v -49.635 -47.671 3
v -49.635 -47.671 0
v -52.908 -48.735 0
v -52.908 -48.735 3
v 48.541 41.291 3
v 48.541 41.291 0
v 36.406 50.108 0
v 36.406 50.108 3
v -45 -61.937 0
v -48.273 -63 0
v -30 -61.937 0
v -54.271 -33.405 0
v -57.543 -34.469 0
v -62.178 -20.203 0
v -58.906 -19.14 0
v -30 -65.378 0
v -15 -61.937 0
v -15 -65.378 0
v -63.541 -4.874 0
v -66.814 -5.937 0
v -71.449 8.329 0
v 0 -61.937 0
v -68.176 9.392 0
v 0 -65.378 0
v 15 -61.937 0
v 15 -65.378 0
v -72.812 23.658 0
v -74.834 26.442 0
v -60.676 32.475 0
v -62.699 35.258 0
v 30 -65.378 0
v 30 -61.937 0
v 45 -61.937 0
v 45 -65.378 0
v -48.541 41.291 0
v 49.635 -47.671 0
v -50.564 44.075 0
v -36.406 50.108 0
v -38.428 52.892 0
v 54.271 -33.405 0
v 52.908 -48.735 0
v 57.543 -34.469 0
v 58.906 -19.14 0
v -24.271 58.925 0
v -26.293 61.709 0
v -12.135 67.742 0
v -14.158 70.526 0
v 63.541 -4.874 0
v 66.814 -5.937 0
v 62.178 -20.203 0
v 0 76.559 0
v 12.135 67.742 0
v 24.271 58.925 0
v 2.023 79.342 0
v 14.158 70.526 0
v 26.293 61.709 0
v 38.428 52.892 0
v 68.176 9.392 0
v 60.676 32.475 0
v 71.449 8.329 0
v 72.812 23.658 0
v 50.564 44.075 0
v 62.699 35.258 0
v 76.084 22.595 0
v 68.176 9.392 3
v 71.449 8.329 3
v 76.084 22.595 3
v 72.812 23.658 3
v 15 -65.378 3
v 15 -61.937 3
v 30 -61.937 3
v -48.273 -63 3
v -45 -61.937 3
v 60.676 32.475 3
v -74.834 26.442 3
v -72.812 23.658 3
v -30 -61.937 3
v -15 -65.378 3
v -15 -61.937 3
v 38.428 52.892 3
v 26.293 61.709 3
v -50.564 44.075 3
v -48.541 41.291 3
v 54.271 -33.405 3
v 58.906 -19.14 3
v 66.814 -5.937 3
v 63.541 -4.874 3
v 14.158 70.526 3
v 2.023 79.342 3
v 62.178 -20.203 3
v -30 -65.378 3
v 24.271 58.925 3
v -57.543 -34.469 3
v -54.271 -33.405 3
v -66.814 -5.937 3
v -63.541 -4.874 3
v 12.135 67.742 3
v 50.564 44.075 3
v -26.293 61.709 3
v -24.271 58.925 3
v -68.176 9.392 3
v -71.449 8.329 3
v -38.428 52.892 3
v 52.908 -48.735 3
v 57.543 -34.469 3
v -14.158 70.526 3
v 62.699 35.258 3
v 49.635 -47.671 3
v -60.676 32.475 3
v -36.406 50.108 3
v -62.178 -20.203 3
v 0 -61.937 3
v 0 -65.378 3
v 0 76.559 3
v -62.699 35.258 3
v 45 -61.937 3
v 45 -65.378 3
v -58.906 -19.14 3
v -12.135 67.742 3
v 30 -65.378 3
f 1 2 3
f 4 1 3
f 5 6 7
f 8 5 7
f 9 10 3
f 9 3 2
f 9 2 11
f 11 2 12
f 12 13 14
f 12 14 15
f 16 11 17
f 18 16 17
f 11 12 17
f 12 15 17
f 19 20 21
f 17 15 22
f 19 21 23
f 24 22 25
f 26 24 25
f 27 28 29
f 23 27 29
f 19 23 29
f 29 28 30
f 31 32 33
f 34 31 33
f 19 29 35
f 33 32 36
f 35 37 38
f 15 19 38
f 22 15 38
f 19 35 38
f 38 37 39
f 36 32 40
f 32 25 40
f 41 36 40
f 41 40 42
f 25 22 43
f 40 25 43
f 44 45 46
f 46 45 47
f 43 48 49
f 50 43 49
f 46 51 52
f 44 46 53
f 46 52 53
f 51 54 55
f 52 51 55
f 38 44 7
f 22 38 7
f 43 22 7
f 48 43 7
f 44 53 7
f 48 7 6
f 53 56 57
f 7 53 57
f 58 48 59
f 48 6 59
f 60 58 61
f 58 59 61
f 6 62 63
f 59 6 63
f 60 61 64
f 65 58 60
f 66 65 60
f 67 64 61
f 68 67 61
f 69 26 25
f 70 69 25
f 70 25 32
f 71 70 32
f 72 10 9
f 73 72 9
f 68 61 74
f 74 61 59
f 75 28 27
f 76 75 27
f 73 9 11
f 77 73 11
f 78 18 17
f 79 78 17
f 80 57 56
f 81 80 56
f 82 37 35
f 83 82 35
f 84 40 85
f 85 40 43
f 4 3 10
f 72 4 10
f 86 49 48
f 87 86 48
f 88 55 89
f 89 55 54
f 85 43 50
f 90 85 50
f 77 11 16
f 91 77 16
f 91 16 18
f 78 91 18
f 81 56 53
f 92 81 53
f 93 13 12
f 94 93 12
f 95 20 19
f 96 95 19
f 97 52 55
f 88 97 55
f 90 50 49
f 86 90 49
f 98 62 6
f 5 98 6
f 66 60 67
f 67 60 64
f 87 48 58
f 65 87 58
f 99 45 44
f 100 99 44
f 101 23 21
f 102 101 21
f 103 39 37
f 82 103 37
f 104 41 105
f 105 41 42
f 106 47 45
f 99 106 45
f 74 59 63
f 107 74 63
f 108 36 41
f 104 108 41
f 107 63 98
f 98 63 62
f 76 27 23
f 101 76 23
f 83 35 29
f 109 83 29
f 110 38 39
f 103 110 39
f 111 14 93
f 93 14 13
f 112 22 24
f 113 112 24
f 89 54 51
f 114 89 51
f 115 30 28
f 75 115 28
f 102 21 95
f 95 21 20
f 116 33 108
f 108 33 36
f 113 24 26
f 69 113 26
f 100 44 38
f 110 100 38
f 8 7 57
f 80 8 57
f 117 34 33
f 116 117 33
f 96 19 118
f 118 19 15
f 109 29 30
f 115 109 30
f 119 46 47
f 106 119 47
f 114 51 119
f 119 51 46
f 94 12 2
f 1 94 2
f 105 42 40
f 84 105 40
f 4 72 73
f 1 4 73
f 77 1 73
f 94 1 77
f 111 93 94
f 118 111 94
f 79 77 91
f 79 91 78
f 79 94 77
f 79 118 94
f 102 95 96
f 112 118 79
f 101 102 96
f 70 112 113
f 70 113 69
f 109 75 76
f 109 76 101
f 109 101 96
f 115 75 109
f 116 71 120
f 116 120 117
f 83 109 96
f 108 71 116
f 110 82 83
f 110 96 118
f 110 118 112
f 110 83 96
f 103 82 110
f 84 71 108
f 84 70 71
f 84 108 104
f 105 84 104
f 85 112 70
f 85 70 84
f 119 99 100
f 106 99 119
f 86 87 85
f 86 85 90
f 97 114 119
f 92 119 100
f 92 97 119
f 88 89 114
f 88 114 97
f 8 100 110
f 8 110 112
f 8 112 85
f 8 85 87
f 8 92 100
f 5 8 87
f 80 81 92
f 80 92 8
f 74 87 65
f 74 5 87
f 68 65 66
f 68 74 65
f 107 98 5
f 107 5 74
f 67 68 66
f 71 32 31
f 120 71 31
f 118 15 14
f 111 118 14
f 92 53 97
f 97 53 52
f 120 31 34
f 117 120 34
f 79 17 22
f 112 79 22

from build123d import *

# Parameters (mm, degrees)
F1_DEPTH = 3


with BuildPart() as f1:
    # F0 (on Top) → F1 (new body)
    with BuildSketch(Plane.XY):
        Polygon((63.54102, -4.873795), (68.176275, 9.392052), (71.448817, 8.328739), (76.084072, 22.594587), (72.811529, 23.6579), (60.676275, 32.474679), (62.698817, 35.25847), (50.563562, 44.075249), (48.54102, 41.291458), (36.405765, 50.108236), (38.428307, 52.892027), (26.293052, 61.708806), (24.27051, 58.925015), (12.135255, 67.741794), (14.157797, 70.525585), (2.022542, 79.342364), (0, 76.558573), (-12.135255, 67.741794), (-14.157797, 70.525585), (-26.293052, 61.708806), (-24.27051, 58.925015), (-36.405765, 50.108236), (-38.428307, 52.892027), (-50.563562, 44.075249), (-48.54102, 41.291458), (-60.676275, 32.474679), (-62.698817, 35.25847), (-74.834072, 26.441691), (-72.811529, 23.6579), (-68.176275, 9.392052), (-71.448817, 8.328739), (-66.813562, -5.937109), (-63.54102, -4.873795), (-58.905765, -19.139643), (-62.178307, -20.202957), (-57.543052, -34.468804), (-54.27051, -33.405491), (-49.635255, -47.671339), (-52.907797, -48.734652), (-48.272542, -63.0005), (-45, -61.937186), (-30, -61.937186), (-30, -65.378141), (-15, -65.378141), (-15, -61.937186), (0, -61.937186), (0, -65.378141), (15, -65.378141), (15, -61.937186), (30, -61.937186), (30, -65.378141), (45, -65.378141), (45, -61.937186), (49.635255, -47.671339), (52.907797, -48.734652), (57.543052, -34.468804), (54.27051, -33.405491), (58.905765, -19.139643), (62.178307, -20.202957), (66.813562, -5.937109), align=None)
    extrude(amount=F1_DEPTH)


solid = f1.part
